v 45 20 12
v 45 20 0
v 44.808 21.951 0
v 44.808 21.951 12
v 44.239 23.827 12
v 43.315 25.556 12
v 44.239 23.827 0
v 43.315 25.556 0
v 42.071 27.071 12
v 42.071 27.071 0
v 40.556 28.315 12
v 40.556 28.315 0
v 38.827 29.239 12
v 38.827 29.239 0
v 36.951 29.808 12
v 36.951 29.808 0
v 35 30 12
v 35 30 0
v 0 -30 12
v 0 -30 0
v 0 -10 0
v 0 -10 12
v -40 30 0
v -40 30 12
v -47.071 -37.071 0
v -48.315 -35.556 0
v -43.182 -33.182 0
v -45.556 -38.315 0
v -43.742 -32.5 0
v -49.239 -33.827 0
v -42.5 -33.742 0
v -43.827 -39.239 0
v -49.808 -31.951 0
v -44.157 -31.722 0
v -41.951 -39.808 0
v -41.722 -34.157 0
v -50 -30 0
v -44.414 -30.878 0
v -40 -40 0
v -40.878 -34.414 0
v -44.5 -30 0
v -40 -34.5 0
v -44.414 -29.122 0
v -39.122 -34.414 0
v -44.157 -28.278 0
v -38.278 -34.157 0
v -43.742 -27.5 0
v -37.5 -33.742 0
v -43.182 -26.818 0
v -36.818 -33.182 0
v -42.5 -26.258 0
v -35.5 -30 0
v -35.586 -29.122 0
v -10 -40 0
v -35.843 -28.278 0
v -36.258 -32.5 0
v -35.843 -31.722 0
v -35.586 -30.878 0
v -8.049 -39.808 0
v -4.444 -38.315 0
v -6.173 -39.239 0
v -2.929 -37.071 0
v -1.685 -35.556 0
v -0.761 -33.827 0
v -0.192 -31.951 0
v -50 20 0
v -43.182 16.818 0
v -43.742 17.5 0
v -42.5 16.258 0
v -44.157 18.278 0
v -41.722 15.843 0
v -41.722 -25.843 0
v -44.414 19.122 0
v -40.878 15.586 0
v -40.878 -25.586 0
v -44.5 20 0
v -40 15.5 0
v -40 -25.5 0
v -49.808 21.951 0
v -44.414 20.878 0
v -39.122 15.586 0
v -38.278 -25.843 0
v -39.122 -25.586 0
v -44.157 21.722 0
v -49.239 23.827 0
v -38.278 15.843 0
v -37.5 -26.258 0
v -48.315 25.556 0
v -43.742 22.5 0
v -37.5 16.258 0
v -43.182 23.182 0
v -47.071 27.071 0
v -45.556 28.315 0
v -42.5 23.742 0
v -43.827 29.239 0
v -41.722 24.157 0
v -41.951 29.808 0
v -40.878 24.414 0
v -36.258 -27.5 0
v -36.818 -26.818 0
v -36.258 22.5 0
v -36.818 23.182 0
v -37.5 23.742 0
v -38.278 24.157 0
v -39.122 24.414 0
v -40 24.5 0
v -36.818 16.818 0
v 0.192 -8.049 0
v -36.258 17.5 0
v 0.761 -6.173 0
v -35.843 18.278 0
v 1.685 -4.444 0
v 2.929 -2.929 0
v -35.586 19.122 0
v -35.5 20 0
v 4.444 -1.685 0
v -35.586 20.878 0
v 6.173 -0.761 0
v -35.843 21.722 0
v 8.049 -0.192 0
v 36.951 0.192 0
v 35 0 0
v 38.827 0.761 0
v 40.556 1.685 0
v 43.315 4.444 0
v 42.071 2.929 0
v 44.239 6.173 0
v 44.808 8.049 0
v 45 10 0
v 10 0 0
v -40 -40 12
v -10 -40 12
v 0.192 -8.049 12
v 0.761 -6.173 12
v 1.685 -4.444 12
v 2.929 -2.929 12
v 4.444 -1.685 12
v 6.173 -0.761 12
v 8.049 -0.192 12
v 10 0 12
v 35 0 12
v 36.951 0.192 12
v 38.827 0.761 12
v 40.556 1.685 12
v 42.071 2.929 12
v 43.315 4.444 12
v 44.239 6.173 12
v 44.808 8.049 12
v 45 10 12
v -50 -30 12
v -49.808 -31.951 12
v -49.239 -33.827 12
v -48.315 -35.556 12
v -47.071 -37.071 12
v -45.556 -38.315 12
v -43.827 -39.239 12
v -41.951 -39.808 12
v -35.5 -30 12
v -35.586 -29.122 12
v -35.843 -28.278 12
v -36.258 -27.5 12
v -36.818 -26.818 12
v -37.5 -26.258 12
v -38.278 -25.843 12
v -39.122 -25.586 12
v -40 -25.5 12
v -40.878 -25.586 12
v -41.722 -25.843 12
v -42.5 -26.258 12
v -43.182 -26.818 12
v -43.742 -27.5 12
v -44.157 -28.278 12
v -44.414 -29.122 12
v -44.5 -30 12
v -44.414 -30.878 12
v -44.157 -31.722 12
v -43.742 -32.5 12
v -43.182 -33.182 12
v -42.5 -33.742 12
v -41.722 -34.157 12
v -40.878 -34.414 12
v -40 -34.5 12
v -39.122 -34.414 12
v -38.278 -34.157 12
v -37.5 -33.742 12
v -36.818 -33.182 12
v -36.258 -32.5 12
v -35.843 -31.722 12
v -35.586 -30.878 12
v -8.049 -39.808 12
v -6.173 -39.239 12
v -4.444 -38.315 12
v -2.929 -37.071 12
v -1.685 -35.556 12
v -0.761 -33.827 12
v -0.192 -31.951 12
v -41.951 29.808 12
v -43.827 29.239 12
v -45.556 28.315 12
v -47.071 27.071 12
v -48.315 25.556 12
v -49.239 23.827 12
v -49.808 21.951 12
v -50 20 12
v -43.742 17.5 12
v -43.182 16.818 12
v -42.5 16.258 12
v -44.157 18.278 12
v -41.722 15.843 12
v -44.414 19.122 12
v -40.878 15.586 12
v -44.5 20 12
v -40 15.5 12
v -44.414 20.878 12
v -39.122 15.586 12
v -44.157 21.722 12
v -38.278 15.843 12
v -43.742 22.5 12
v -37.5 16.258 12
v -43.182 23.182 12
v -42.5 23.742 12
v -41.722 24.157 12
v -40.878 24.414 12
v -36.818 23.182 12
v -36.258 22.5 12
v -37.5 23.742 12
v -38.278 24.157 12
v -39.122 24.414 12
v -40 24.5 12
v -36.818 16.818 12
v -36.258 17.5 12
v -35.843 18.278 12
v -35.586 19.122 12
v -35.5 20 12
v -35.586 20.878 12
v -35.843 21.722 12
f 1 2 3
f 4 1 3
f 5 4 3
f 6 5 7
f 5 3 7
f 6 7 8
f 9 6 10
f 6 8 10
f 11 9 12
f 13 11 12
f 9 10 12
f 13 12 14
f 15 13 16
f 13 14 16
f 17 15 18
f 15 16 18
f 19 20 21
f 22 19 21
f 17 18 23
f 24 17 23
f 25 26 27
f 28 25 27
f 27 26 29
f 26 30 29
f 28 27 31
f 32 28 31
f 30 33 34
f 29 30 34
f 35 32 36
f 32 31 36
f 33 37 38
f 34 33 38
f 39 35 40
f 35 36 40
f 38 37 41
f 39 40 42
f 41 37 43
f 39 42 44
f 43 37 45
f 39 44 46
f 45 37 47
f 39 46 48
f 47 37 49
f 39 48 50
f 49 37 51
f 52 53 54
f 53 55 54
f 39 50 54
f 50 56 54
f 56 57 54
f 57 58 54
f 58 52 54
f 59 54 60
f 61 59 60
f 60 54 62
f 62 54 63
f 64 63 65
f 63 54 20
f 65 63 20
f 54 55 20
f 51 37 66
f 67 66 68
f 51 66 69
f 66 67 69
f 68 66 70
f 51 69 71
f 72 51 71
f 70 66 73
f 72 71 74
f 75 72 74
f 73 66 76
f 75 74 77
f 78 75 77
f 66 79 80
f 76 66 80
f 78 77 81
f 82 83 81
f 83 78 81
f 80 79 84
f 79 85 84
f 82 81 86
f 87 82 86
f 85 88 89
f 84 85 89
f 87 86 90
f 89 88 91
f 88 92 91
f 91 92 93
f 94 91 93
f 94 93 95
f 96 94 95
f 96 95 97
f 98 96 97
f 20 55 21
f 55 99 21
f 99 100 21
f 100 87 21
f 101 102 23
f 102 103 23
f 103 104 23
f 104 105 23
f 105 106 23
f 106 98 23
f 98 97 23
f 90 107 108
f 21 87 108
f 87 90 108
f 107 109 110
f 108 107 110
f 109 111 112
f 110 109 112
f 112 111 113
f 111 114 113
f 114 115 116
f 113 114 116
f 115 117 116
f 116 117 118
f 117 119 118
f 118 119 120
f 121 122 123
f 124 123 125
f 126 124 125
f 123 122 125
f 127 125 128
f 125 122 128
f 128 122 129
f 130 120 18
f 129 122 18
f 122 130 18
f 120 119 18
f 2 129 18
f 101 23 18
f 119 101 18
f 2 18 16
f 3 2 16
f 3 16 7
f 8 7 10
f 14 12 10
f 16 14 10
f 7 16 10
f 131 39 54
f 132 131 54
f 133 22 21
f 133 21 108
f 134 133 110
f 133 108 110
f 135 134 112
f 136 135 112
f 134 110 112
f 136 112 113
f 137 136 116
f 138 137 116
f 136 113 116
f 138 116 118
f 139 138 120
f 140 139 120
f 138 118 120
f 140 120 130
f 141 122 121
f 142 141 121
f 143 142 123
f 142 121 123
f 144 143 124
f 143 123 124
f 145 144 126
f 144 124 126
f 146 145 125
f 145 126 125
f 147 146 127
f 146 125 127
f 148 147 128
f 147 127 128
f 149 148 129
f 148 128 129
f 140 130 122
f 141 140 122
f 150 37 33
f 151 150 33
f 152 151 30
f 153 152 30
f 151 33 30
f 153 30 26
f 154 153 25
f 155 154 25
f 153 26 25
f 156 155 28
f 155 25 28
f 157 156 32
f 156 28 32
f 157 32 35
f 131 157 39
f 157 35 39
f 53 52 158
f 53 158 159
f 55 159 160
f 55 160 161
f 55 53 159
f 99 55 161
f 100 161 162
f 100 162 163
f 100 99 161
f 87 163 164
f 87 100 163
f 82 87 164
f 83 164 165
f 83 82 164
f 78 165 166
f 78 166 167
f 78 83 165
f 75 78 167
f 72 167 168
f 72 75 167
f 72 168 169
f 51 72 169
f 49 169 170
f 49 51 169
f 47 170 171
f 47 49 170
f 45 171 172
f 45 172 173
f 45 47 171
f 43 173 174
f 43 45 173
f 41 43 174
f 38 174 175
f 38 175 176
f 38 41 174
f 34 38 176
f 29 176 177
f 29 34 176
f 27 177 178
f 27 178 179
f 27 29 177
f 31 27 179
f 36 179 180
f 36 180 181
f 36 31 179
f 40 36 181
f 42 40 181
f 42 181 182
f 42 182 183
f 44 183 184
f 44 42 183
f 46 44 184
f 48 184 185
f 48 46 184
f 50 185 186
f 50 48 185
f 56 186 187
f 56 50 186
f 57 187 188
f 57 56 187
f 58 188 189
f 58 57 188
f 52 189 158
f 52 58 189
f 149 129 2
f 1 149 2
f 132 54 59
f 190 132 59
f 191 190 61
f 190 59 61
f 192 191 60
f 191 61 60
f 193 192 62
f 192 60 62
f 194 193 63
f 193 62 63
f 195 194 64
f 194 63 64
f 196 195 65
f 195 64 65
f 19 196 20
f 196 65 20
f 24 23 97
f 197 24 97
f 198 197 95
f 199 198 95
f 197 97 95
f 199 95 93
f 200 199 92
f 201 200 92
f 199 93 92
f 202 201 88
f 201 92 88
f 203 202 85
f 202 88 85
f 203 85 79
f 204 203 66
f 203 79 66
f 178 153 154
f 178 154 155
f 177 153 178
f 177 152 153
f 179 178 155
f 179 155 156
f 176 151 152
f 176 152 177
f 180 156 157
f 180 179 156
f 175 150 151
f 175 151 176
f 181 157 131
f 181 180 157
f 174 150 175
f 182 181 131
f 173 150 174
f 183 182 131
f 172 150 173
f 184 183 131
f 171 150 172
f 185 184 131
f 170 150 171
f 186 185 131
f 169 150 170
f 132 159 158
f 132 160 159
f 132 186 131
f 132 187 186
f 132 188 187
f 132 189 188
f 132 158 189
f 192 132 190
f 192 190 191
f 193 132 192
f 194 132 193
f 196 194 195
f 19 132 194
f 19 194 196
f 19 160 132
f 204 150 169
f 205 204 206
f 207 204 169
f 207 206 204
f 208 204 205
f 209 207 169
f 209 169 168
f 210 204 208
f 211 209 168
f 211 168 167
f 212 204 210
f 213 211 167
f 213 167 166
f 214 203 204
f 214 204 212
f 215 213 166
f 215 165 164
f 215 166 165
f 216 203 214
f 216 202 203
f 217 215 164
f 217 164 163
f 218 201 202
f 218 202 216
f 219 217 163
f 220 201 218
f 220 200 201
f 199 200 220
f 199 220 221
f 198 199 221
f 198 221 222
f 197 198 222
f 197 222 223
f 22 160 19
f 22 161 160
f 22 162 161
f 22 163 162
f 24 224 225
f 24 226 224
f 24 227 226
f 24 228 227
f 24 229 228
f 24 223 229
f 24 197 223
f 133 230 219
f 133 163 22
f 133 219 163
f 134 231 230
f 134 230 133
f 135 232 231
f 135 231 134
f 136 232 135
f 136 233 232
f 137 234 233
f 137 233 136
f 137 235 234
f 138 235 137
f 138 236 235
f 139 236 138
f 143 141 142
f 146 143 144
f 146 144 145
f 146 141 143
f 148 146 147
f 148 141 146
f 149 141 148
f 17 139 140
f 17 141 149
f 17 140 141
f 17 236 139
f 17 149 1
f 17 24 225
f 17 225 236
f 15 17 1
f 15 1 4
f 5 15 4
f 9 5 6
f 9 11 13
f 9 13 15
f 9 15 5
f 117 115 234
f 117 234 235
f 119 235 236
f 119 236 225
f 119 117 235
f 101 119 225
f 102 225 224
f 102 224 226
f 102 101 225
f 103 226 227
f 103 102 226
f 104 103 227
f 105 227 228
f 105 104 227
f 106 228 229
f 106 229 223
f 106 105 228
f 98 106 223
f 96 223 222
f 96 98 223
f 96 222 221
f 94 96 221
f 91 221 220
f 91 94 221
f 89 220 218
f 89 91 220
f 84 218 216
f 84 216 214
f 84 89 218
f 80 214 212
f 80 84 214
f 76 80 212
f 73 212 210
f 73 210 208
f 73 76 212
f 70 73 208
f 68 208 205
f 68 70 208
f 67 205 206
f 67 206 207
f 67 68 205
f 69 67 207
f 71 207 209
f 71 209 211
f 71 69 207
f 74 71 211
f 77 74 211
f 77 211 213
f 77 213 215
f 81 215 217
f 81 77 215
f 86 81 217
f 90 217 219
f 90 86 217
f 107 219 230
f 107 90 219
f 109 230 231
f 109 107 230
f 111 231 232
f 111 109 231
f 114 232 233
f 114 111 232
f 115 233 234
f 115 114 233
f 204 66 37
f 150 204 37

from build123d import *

# Parameters (mm, degrees)
F0_R     = 4.5
F1_DEPTH = 12


with BuildPart() as f1:
    # F0 (on Top) → F1 (new body)
    with BuildSketch(Plane.XY):
        with BuildLine():
            ThreePointArc((0, -10), (2.928932, -2.928932), (10, 0))
            Line((10, 0), (35, 0))
            ThreePointArc((35, 0), (42.071068, 2.928932), (45, 10))
            Line((45, 10), (45, 20))
            ThreePointArc((45, 20), (42.071068, 27.071068), (35, 30))
            Line((35, 30), (-40, 30))
            ThreePointArc((-40, 30), (-47.071068, 27.071068), (-50, 20))
            Line((-50, 20), (-50, -30))
            ThreePointArc((-50, -30), (-47.071068, -37.071068), (-40, -40))
            Line((-40, -40), (-10, -40))
            ThreePointArc((-10, -40), (-2.928932, -37.071068), (0, -30))
            Line((0, -30), (0, -10))
        make_face()
        with Locations((-40, -30)):
            Circle(F0_R, mode=Mode.SUBTRACT)
        with Locations((-40, 20)):
            Circle(F0_R, mode=Mode.SUBTRACT)
    extrude(amount=F1_DEPTH)


solid = f1.part
